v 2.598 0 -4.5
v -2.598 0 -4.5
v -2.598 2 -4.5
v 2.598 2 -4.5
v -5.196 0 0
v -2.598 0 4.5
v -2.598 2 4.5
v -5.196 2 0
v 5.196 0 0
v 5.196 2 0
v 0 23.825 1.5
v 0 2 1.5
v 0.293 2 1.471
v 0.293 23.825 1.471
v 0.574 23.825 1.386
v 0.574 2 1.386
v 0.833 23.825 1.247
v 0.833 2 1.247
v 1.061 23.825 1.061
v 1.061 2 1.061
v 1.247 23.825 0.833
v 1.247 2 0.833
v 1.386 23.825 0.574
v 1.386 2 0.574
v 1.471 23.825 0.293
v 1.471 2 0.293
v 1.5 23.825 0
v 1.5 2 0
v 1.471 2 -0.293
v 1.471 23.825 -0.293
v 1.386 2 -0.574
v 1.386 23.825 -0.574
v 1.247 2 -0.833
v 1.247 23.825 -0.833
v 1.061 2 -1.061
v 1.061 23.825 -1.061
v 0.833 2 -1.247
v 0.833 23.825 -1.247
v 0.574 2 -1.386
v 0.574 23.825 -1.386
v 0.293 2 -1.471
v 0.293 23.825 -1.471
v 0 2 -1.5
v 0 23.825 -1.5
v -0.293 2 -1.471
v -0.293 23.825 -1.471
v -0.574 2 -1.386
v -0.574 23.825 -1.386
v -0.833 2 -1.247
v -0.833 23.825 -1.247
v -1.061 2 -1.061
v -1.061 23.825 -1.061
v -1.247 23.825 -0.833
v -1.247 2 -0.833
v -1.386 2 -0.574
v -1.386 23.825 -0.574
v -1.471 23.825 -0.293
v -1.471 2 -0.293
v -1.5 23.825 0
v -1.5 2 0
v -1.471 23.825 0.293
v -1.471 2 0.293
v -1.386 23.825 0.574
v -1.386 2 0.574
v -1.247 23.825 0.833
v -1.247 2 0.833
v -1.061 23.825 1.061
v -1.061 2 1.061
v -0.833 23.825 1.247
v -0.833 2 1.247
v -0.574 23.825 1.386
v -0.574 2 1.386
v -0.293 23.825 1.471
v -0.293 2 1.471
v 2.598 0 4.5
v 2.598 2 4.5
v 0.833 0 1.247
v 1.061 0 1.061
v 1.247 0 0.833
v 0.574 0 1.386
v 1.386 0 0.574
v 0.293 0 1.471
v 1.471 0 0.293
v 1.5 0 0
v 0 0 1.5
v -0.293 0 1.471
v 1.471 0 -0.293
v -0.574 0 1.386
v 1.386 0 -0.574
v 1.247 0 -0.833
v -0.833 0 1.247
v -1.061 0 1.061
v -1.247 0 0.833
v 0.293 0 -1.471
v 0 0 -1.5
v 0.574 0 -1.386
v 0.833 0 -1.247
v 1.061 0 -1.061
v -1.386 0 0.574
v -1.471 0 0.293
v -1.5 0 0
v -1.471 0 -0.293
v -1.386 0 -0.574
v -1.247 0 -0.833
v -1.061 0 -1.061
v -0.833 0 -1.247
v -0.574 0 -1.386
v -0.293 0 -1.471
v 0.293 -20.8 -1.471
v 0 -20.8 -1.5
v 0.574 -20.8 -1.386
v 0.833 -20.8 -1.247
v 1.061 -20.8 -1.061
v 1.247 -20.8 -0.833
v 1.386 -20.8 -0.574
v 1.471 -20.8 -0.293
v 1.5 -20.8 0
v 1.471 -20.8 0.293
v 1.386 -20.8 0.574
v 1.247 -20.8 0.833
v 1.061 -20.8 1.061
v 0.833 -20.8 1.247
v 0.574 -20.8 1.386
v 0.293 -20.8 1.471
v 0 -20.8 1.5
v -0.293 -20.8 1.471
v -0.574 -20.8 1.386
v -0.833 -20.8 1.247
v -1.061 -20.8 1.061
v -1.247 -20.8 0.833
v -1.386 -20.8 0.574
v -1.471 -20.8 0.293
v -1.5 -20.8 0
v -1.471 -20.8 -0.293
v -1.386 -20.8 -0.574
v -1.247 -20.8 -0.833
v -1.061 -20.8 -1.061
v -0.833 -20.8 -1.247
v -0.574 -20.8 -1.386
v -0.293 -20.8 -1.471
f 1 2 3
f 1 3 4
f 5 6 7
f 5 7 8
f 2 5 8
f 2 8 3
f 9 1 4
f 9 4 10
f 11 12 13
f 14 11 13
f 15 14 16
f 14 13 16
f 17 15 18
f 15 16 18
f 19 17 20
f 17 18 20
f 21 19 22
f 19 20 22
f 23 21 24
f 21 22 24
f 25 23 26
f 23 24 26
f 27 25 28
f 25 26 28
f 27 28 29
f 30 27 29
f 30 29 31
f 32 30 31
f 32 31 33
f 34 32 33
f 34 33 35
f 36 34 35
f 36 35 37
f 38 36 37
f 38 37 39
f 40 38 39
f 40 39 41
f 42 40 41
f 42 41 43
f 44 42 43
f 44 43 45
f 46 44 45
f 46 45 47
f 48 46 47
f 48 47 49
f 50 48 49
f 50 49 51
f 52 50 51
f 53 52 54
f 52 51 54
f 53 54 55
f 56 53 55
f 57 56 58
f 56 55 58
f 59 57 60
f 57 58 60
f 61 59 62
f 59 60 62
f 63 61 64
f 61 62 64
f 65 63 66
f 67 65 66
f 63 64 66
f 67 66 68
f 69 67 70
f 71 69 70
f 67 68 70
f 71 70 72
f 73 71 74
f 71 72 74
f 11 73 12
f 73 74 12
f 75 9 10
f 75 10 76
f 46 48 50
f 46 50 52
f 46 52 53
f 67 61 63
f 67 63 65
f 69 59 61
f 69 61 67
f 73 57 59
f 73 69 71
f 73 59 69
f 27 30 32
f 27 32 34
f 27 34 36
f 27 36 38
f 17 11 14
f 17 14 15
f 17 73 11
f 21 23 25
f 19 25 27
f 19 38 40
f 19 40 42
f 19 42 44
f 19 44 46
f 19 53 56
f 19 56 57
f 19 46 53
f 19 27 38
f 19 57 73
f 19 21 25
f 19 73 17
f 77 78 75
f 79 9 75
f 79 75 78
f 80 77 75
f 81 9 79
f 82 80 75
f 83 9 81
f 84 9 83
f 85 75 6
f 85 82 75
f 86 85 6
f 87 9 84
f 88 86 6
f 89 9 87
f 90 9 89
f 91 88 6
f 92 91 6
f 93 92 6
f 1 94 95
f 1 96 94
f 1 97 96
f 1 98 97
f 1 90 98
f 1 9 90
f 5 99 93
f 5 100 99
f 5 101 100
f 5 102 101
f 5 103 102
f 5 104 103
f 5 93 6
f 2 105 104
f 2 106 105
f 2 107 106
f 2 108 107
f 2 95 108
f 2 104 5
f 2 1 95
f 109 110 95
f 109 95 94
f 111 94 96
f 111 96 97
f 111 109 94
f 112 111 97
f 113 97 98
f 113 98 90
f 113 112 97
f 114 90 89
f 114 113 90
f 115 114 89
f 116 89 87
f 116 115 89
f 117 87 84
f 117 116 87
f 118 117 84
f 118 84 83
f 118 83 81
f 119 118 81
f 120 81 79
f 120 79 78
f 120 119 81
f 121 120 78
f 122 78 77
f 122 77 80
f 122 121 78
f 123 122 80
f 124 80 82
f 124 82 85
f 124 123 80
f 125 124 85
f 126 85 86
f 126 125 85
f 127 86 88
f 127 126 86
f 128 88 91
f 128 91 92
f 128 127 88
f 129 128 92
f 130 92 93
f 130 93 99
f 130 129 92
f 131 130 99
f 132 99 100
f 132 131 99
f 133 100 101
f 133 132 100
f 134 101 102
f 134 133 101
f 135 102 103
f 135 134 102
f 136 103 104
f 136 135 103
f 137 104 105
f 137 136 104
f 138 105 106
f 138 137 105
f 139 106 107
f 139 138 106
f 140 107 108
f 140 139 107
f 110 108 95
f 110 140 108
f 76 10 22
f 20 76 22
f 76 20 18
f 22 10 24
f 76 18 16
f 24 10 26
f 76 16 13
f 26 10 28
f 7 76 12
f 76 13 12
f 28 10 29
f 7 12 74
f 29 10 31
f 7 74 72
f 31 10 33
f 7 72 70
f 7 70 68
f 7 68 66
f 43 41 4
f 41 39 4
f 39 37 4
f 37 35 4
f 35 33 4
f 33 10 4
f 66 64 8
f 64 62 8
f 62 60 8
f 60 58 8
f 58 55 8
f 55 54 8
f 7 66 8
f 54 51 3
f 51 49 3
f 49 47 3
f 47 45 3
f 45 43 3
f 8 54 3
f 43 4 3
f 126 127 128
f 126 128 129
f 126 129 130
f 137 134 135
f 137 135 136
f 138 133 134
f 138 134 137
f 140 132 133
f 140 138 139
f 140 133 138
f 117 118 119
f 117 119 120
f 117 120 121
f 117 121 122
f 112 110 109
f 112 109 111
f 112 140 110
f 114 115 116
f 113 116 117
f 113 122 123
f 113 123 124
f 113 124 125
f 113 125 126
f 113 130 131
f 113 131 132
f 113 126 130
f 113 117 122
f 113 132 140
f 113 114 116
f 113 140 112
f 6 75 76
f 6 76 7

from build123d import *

# Parameters (mm, degrees)
SKETCH1_R           = 1.5
BOSS_EXTRUDE1_DEPTH = 23.825
BOSS_EXTRUDE2_DEPTH = 2
BOSS_EXTRUDE3_START = 20.8
SKETCH4_R           = 1.5
BOSS_EXTRUDE3_DEPTH = 20.8


with BuildPart() as part:
    # Sketch1 → Boss-Extrude1 (new body)
    with BuildSketch(Plane(origin=(0, 0, 0), x_dir=(1, 0, 0), z_dir=(0, 1, 0))):
        with Locations(Location((0, 0, 0), (0, 0, 270))):
            Circle(SKETCH1_R)
    extrude(amount=BOSS_EXTRUDE1_DEPTH)

    # Sketch3 → Boss-Extrude2 (add)
    with BuildSketch(Plane(origin=(0, 0, 0), x_dir=(-1, 0, 0), z_dir=(0, -1, 0))):
        Polygon((5.196152423, 0), (2.598076211, 4.5), (-2.598076211, 4.5), (-5.196152423, 0), (-2.598076211, -4.5), (2.598076211, -4.5), align=None)
    extrude(amount=-BOSS_EXTRUDE2_DEPTH)

    # Sketch4 → Boss-Extrude3 (add)
    with BuildSketch(Plane(origin=(0, 0, 0), x_dir=(-1, 0, 0), z_dir=(0, -1, 0)).offset(BOSS_EXTRUDE3_START)):
        with Locations(Location((0, 0, 0), (0, 0, 90))):
            Circle(SKETCH4_R)
    extrude(amount=-BOSS_EXTRUDE3_DEPTH)


solid = part.part
